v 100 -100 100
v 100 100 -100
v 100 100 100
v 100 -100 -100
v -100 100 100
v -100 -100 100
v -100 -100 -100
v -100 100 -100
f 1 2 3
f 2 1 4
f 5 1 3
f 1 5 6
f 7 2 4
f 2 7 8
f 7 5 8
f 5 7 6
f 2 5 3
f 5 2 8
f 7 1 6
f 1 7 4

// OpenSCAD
cube_sizes = [10, 20, 200]; // Example cube sizes

for (size = cube_sizes) {
    cube(size, center = true);
}
